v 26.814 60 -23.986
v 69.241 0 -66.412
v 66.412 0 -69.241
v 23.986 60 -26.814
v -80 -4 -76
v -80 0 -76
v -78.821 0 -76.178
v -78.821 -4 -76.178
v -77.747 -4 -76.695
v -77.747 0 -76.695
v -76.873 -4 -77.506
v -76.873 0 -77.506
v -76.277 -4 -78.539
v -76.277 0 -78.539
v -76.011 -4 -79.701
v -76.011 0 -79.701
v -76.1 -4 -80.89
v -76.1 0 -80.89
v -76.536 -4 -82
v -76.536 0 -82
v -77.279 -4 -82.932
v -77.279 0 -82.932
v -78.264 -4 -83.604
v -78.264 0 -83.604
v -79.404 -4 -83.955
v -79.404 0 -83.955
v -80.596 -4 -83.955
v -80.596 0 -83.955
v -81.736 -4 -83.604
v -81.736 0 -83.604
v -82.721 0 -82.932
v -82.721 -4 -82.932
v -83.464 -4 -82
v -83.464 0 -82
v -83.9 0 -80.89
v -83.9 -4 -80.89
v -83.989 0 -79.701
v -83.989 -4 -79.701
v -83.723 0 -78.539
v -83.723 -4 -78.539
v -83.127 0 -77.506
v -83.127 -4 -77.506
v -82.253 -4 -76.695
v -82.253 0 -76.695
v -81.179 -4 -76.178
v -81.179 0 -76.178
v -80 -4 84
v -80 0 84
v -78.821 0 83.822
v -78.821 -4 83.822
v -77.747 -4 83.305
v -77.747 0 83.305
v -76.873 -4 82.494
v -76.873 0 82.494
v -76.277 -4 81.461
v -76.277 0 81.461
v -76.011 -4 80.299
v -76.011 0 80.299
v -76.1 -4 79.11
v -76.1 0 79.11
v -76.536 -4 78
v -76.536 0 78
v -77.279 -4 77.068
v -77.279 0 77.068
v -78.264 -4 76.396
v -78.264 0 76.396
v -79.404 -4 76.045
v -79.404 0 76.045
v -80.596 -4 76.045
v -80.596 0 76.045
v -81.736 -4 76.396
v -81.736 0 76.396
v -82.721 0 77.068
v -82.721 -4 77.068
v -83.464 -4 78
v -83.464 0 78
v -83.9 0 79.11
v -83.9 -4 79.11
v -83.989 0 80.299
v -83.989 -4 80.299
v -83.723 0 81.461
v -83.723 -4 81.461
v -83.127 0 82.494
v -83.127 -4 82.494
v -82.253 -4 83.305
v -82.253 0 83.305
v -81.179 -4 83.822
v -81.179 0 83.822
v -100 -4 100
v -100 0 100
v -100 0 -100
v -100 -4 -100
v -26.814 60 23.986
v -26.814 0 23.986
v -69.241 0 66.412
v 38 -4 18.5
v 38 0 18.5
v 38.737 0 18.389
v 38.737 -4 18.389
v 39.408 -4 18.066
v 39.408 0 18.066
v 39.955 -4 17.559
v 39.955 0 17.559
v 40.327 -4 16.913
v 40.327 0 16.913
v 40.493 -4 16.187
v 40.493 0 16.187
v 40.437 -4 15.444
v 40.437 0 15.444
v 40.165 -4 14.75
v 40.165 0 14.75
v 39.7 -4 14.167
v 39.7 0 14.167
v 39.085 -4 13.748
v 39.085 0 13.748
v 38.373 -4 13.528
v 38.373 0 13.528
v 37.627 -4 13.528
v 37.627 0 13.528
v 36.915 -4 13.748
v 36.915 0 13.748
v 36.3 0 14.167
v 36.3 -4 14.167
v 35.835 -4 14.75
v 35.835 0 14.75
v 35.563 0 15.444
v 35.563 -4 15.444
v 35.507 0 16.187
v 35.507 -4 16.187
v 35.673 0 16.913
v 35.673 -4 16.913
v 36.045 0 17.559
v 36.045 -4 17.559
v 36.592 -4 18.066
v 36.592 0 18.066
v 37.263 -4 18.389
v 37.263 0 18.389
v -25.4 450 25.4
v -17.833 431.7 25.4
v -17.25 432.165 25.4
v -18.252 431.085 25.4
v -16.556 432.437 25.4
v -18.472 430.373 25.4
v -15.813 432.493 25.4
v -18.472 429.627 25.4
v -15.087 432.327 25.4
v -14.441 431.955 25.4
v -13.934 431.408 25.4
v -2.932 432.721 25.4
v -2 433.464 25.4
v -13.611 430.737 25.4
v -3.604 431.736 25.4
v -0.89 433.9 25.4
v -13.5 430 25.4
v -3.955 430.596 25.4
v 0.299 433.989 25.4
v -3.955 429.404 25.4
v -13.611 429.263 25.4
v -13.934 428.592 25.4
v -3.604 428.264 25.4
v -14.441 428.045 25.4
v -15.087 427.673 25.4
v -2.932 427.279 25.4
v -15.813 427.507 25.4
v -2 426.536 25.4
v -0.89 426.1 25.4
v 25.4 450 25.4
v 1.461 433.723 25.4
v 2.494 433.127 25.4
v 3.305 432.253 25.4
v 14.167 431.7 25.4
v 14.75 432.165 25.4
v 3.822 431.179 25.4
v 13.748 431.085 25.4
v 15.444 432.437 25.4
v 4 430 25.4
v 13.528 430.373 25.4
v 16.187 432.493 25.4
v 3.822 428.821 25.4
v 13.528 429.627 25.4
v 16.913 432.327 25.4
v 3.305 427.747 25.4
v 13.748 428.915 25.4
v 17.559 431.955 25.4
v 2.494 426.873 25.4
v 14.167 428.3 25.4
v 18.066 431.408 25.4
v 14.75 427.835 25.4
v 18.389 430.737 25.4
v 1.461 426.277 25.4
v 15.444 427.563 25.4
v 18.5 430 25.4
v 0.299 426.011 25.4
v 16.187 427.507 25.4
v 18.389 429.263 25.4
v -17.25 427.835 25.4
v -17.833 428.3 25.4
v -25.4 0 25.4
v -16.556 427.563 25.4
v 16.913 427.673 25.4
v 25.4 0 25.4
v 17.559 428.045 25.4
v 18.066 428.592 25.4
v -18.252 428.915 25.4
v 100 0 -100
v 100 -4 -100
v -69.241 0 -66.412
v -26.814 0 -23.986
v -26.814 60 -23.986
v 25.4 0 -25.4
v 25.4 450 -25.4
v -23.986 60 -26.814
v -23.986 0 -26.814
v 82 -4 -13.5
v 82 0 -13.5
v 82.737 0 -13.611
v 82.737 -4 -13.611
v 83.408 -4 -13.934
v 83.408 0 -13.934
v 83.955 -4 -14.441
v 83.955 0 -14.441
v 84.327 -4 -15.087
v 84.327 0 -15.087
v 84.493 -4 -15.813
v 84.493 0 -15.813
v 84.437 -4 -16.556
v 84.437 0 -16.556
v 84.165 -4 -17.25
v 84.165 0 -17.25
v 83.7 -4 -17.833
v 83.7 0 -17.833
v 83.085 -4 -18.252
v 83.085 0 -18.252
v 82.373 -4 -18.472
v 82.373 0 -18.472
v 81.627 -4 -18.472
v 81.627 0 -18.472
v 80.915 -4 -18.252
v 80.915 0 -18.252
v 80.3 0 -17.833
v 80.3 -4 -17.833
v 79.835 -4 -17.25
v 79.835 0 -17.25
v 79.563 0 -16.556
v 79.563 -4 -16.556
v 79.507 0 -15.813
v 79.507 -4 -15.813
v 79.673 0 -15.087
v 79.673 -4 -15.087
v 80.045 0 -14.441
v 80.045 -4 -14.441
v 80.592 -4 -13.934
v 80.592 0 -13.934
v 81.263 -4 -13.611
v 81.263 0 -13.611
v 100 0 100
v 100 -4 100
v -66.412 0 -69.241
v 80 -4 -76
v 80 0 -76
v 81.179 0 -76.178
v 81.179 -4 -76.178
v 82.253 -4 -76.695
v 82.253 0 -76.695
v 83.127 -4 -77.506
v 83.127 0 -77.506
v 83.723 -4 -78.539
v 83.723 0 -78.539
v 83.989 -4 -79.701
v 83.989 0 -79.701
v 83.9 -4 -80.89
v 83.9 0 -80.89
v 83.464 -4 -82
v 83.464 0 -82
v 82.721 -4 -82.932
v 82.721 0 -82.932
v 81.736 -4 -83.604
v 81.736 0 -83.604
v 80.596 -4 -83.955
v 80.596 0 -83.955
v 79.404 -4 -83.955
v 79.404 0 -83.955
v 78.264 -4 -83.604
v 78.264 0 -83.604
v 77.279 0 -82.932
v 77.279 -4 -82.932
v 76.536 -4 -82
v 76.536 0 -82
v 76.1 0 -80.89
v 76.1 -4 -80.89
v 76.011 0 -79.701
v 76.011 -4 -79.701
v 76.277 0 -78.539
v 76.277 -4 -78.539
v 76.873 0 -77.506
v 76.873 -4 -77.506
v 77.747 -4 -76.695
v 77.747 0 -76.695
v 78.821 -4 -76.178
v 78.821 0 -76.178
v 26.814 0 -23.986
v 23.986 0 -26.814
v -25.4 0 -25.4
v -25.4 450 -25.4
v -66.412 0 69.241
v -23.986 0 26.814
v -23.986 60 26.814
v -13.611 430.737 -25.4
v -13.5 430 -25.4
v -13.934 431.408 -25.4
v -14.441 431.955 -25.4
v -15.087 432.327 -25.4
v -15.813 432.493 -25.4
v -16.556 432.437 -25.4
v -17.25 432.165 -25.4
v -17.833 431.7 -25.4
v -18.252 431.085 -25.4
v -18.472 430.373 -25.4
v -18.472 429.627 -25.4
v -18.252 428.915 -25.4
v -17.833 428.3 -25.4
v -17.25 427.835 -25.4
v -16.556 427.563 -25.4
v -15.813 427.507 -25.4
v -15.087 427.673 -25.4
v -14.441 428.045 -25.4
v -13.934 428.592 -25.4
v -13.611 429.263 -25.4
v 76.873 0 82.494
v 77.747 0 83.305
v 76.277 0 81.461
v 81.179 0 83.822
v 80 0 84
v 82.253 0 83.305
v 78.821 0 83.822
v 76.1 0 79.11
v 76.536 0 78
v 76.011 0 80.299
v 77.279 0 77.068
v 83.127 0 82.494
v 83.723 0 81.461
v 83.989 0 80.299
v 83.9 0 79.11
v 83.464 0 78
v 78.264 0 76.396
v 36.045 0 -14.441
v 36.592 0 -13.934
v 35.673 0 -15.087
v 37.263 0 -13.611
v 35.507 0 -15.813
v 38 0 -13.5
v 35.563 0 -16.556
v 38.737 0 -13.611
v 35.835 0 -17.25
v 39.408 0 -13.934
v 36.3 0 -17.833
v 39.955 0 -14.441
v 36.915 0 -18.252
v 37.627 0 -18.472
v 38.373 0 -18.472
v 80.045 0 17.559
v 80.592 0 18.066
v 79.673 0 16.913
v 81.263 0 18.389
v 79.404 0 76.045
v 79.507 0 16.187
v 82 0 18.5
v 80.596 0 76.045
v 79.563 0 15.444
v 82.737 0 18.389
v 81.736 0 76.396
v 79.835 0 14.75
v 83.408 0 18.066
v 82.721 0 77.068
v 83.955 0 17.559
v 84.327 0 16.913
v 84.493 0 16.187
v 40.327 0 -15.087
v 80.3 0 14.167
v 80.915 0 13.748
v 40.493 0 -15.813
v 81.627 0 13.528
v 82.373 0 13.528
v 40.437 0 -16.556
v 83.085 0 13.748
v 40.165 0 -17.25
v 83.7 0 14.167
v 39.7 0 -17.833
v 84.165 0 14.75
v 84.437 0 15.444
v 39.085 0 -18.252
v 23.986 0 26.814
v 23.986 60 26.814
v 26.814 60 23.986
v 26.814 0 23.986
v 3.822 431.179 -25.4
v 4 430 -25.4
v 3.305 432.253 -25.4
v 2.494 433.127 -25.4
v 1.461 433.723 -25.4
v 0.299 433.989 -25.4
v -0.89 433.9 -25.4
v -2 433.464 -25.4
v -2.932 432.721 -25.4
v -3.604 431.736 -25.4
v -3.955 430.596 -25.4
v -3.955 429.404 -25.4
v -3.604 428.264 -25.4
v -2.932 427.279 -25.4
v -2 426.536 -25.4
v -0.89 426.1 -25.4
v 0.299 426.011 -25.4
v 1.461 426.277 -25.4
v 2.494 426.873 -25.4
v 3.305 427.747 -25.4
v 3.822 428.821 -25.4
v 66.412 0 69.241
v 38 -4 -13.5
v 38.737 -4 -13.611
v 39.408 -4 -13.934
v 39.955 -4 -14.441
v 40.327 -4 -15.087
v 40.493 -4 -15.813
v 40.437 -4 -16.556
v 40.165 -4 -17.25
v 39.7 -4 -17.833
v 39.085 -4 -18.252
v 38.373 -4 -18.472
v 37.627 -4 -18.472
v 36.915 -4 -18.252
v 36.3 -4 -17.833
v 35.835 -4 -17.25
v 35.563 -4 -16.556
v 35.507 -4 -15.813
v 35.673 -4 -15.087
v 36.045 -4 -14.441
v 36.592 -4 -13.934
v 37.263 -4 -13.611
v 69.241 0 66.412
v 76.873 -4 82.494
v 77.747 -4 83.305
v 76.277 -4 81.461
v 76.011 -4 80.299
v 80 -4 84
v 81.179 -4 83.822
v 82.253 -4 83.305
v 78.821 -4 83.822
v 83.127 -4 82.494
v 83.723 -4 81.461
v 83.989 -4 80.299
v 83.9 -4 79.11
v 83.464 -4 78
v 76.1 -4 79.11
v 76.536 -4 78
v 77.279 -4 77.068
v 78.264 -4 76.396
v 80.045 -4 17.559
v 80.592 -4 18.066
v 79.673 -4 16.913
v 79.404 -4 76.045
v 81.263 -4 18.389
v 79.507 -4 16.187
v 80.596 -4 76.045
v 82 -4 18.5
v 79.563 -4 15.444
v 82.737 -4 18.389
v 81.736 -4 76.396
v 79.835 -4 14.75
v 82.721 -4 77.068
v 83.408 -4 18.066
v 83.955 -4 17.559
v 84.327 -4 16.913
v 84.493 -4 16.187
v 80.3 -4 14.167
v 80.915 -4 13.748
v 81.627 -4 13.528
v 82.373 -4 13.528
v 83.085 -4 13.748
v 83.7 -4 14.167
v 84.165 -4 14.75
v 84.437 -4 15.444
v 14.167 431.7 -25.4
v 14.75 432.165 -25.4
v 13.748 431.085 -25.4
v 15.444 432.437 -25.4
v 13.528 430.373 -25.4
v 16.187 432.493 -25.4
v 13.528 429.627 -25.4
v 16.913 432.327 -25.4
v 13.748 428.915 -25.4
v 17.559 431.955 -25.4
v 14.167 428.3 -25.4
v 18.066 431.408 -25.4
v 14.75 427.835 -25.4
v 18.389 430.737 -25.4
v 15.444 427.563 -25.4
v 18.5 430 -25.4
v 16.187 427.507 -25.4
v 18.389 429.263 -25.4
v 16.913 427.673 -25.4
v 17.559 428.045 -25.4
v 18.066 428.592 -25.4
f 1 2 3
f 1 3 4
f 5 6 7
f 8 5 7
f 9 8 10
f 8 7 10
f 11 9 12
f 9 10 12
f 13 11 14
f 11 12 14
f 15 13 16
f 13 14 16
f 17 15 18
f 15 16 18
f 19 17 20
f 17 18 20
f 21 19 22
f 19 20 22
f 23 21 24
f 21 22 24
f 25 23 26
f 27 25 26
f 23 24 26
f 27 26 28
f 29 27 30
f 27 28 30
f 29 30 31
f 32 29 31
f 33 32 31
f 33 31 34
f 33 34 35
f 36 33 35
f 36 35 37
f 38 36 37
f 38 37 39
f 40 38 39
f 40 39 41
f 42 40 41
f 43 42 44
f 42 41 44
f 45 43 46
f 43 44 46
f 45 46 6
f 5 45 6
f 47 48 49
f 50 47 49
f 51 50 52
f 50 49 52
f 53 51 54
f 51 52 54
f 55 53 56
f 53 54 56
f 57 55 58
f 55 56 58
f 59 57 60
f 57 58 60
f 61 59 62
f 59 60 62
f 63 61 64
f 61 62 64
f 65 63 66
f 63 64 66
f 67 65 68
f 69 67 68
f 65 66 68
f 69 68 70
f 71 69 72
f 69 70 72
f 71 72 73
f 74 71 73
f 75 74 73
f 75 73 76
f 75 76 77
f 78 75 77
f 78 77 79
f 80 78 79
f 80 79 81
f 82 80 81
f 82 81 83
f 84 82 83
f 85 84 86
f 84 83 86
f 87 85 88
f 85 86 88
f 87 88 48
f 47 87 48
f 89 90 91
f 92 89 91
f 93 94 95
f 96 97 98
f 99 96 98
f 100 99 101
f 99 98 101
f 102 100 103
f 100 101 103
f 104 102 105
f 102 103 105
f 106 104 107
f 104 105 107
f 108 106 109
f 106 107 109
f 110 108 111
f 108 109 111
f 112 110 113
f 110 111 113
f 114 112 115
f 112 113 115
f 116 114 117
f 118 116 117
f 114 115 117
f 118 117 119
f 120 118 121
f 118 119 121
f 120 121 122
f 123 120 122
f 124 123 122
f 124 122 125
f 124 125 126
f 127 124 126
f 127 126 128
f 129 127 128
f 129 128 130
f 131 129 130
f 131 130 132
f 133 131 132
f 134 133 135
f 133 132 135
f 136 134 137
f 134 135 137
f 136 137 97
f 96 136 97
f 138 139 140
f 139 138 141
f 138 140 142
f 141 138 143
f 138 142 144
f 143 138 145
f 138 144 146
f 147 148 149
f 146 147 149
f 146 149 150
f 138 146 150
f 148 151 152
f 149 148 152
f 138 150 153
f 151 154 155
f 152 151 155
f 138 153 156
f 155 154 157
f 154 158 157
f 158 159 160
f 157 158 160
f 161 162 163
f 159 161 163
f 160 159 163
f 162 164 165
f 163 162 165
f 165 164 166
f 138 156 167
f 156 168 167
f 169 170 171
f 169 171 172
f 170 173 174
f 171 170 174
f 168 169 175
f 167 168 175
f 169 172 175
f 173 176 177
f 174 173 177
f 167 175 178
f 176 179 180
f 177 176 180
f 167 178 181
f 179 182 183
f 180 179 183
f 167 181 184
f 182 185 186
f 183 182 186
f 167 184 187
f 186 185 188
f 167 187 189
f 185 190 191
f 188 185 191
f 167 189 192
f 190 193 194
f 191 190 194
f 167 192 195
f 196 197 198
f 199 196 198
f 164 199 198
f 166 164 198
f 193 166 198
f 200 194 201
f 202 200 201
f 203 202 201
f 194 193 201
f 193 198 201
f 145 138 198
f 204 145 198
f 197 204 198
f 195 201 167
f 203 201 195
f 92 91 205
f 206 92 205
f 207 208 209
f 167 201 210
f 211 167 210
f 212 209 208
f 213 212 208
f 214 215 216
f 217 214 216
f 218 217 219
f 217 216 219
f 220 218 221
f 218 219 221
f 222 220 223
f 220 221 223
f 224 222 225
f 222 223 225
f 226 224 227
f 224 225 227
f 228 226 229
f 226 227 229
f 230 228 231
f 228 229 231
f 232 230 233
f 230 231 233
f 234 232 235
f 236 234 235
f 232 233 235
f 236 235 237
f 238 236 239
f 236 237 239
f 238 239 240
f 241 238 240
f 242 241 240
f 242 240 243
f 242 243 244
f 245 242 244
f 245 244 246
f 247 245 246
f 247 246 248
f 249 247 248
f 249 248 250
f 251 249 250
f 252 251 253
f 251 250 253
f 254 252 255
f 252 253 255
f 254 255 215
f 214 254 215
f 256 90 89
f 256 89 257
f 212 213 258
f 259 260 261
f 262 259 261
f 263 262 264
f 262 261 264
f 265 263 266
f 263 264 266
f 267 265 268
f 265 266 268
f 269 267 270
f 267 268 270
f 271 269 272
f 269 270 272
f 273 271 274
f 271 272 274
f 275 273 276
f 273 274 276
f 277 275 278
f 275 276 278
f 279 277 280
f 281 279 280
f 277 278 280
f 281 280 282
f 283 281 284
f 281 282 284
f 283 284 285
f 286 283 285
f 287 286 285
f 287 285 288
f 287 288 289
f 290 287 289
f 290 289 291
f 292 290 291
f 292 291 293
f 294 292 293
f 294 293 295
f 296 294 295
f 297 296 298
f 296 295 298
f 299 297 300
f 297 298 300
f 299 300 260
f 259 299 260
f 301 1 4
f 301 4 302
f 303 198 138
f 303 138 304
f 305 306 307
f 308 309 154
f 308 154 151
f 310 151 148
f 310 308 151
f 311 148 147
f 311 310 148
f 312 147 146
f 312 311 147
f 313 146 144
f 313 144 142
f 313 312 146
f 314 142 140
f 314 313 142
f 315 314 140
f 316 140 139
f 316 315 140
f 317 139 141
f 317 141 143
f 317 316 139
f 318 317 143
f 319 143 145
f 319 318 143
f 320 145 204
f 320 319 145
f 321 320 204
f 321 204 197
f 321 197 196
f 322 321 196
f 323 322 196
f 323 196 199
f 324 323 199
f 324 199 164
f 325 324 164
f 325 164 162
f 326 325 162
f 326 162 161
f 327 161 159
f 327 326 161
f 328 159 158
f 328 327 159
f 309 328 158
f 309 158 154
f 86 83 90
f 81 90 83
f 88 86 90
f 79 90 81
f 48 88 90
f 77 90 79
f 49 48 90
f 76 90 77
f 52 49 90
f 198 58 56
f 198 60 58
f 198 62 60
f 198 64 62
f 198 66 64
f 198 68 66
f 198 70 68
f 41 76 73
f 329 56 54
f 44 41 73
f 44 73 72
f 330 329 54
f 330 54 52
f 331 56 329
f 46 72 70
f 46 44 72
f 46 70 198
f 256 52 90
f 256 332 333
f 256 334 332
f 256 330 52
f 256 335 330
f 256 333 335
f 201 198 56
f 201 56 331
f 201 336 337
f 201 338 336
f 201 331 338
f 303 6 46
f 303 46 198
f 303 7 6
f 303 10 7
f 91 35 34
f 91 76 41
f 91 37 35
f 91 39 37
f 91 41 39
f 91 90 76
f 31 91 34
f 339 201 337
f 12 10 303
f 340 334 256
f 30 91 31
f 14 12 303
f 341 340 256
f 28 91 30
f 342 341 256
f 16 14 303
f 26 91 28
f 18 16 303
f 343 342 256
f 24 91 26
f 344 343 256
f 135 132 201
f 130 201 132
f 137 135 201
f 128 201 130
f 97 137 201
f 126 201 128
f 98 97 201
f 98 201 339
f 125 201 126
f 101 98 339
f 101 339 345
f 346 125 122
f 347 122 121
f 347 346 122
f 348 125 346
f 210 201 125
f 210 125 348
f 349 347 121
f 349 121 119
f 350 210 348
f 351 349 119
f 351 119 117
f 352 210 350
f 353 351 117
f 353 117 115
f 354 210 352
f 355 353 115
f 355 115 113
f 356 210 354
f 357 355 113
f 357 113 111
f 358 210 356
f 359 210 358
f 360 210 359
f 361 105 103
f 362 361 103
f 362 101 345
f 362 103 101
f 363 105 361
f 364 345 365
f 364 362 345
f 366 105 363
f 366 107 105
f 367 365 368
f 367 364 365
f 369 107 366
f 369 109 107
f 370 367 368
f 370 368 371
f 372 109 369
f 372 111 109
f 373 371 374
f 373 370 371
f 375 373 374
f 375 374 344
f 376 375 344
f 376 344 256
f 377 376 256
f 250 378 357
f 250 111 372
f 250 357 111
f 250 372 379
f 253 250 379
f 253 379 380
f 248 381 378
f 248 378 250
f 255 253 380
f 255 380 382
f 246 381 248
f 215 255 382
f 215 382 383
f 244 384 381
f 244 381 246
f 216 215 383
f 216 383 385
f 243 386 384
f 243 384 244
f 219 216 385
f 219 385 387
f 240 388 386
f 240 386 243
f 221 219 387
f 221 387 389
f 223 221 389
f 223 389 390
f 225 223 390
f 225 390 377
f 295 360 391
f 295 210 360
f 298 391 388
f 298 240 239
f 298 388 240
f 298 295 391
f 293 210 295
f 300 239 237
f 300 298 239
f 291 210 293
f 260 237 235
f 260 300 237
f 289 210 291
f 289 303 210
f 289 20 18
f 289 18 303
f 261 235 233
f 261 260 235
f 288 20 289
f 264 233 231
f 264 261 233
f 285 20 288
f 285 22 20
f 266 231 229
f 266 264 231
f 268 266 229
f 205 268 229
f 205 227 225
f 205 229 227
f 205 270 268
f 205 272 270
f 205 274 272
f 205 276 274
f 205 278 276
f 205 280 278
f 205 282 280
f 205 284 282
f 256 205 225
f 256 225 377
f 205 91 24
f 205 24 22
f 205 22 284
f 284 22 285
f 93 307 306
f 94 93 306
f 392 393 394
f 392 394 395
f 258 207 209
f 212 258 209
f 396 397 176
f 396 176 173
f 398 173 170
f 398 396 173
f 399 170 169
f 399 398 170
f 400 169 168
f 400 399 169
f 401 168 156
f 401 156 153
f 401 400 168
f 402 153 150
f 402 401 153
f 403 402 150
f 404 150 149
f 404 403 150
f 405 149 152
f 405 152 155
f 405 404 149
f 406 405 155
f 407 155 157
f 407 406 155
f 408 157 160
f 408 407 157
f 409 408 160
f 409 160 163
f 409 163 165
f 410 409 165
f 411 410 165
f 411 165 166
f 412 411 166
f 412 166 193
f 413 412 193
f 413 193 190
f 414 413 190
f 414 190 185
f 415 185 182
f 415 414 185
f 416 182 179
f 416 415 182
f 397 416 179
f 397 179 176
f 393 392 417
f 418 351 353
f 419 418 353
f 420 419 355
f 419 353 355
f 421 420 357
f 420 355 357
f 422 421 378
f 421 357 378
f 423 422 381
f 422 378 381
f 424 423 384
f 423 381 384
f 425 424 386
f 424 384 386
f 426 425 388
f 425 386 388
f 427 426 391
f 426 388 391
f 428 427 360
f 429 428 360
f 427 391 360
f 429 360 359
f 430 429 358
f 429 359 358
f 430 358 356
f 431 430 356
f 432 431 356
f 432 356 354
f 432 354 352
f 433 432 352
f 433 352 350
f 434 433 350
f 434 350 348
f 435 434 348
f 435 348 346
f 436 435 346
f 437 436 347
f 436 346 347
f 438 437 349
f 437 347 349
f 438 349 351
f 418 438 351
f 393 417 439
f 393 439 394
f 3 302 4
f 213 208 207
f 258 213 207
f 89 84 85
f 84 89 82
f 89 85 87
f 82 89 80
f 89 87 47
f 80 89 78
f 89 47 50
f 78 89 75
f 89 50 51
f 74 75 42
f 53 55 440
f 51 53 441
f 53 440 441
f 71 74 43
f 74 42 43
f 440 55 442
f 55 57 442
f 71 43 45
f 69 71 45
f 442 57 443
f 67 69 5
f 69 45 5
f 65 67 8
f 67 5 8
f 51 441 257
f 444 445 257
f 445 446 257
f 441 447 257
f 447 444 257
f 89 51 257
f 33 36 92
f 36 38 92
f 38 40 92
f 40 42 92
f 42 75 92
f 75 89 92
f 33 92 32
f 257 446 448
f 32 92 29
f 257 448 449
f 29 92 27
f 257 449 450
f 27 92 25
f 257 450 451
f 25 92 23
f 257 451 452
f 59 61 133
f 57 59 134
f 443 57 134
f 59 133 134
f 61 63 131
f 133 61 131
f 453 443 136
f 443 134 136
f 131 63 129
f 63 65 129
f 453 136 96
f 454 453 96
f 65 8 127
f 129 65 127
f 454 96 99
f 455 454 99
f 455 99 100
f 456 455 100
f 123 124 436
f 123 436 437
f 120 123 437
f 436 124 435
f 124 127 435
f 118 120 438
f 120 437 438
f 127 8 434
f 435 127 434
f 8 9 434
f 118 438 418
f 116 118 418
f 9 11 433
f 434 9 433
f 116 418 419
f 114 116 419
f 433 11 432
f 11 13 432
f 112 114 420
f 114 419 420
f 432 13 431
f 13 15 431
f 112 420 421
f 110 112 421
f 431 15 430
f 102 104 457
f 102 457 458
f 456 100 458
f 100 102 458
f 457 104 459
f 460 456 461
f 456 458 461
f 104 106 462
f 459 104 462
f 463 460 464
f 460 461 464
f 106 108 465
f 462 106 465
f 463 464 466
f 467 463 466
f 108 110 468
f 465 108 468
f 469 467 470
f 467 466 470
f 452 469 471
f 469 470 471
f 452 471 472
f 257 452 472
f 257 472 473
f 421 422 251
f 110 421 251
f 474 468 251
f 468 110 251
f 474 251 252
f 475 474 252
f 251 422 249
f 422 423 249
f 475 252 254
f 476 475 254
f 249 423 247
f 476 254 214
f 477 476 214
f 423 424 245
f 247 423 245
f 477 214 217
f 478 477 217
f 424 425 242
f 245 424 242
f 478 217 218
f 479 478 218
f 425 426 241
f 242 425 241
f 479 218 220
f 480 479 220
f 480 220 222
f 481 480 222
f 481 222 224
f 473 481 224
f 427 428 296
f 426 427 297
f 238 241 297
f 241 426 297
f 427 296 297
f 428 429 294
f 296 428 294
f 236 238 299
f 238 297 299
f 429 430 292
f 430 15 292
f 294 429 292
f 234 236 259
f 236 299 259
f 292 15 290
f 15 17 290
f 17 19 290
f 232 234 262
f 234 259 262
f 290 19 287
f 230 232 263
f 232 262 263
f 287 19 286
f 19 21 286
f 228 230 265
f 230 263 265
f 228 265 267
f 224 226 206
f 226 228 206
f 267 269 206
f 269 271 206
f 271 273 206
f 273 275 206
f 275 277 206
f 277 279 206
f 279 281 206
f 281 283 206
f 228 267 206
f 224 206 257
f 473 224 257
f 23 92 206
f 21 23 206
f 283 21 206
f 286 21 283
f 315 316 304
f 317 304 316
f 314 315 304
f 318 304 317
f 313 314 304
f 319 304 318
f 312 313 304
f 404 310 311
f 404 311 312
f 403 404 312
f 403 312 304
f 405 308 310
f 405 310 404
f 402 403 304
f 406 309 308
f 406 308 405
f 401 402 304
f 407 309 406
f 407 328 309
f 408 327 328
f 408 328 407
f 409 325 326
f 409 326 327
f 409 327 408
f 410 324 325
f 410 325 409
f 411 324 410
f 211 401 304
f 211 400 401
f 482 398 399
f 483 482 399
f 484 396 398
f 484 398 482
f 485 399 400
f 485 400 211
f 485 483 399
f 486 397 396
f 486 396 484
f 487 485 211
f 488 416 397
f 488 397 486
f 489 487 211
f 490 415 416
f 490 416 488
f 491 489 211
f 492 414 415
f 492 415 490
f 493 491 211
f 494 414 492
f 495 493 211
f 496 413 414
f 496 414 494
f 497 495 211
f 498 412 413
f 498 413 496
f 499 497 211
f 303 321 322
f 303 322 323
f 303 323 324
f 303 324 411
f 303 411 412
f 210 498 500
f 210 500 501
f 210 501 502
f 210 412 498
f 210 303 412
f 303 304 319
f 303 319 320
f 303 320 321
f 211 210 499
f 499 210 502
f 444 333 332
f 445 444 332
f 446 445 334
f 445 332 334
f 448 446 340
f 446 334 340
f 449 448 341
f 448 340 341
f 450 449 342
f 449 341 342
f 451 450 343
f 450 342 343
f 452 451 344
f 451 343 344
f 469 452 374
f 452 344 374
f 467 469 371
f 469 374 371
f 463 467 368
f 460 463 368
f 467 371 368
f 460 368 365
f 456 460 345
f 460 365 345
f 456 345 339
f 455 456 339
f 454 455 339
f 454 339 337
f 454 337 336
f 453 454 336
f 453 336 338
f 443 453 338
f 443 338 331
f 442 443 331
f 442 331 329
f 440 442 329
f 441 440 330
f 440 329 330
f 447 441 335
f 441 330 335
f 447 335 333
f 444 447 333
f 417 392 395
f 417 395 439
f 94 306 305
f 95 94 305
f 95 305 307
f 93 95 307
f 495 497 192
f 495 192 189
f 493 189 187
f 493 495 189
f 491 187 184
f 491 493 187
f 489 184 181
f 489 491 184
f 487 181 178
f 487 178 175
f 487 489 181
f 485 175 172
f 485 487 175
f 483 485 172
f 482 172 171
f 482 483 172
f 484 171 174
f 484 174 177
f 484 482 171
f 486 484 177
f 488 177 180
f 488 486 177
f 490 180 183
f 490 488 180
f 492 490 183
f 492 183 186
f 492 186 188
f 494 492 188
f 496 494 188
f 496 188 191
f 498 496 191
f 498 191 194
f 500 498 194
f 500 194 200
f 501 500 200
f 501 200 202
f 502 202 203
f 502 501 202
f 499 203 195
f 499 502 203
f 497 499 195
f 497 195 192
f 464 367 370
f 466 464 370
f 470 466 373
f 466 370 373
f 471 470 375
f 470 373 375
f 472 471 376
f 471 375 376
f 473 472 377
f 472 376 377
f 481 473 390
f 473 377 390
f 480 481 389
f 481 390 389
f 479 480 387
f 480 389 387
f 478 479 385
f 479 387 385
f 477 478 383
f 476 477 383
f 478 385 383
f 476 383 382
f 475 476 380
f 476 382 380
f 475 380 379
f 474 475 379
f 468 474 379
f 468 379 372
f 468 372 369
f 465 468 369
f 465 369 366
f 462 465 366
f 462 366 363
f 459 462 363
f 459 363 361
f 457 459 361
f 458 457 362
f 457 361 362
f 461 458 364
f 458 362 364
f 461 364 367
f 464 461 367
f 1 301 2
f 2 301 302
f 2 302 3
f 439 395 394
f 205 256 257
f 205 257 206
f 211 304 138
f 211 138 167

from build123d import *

# Parameters (mm, degrees)
ESBO_O1_W                       = 200
ESBO_O1_H                       = 200
RESSALTO_EXTRUS_O2_DEPTH        = 4
ESBO_O2_W                       = 50.8
ESBO_O2_H                       = 50.8
RESSALTO_EXTRUS_O3_DEPTH        = 450
ESBO_O3_R                       = 4
CORTE_EXTRUS_O1_DEPTH           = 4
CORTE_EXTRUS_O2_DEPTH           = 25.4
CORTE_EXTRUS_O2_DEPTH_BACK      = 25.4
ESBO_O5_R                       = 4
ESBO_O5_R_2                     = 2.5
ESBO_O6_R                       = 2.5
CORTE_EXTRUS_O3_DEPTH           = 4
RESSALTO_EXTRUS_O7_DEPTH        = 2
RESSALTO_EXTRUS_O7_DEPTH_BACK   = 2
RESSALTO_EXTRUS_O7_2_DEPTH      = 2
RESSALTO_EXTRUS_O7_2_DEPTH_BACK = 2
RESSALTO_EXTRUS_O8_DEPTH        = 2
RESSALTO_EXTRUS_O8_DEPTH_BACK   = 2
RESSALTO_EXTRUS_O8_2_DEPTH      = 2
RESSALTO_EXTRUS_O8_2_DEPTH_BACK = 2


with BuildPart() as part:
    # Esboço1 → Ressalto-extrusão2 (new body)
    with BuildSketch(Plane(origin=(0, 0, 0), x_dir=(1, 0, 0), z_dir=(0, 1, 0))):
        Rectangle(ESBO_O1_W, ESBO_O1_H)
    extrude(amount=-RESSALTO_EXTRUS_O2_DEPTH)

    # Esboço2 → Ressalto-extrusão3 (add)
    with BuildSketch(Plane(origin=(0, 0, 0), x_dir=(1, 0, 0), z_dir=(0, 1, 0))):
        Rectangle(ESBO_O2_W, ESBO_O2_H)
    extrude(amount=RESSALTO_EXTRUS_O3_DEPTH)

    # Esboço3 → Corte-extrusão1 (cut)
    with BuildSketch(Plane(origin=(0, 0, 0), x_dir=(1, 0, 0), z_dir=(0, 1, 0))):
        with Locations((80, -80)):
            Circle(ESBO_O3_R)
        with Locations((80, 80)):
            Circle(ESBO_O3_R)
        with Locations((-80, 80)):
            Circle(ESBO_O3_R)
        with Locations((-80, -80)):
            Circle(ESBO_O3_R)
    extrude(amount=-CORTE_EXTRUS_O1_DEPTH, mode=Mode.SUBTRACT)

    # Esboço5 → Corte-extrusão2 (cut, two sides: drawn at the far end of the back side and taken through both)
    with BuildSketch(Plane.XY.offset(-CORTE_EXTRUS_O2_DEPTH_BACK)):
        with Locations((0, 430)):
            Circle(ESBO_O5_R)
        with Locations((16, 430)):
            Circle(ESBO_O5_R_2)
        with Locations((-16, 430)):
            Circle(ESBO_O5_R_2)
    extrude(amount=CORTE_EXTRUS_O2_DEPTH + CORTE_EXTRUS_O2_DEPTH_BACK, mode=Mode.SUBTRACT)

    # Esboço6 → Corte-extrusão3 (cut)
    with BuildSketch(Plane(origin=(0, 0, 0), x_dir=(1, 0, 0), z_dir=(0, 1, 0))):
        with Locations((82, 16)):
            Circle(ESBO_O6_R)
        with Locations((82, -16)):
            Circle(ESBO_O6_R)
        with Locations((38, 16)):
            Circle(ESBO_O6_R)
        with Locations((38, -16)):
            Circle(ESBO_O6_R)
    extrude(amount=-CORTE_EXTRUS_O3_DEPTH, mode=Mode.SUBTRACT)


with BuildPart() as body_2:
    # Esboço8 → Ressalto-extrusão7 (new, two sides: drawn at the far end of the back side and taken through both)
    with BuildSketch(Plane(origin=(0, 0, 0), x_dir=(-0.7071067811865476, 0, -0.7071067811865476), z_dir=(0.7071067811865476, 0, -0.7071067811865476)).offset(-RESSALTO_EXTRUS_O7_DEPTH_BACK)):
        Polygon((35.92102448, 0), (95.92102448, 0), (35.92102448, 60), align=None)
    extrude(amount=RESSALTO_EXTRUS_O7_DEPTH + RESSALTO_EXTRUS_O7_DEPTH_BACK)


with BuildPart() as body_3:
    # Esboço8 → Ressalto-extrus_o7 2 (new, two sides: drawn at the far end of the back side and taken through both)
    with BuildSketch(Plane(origin=(0, 0, 0), x_dir=(-0.7071067811865476, 0, -0.7071067811865476), z_dir=(0.7071067811865476, 0, -0.7071067811865476)).offset(-RESSALTO_EXTRUS_O7_2_DEPTH_BACK)):
        Polygon((-35.92102448, 0), (-95.92102448, 0), (-35.92102448, 60), align=None)
    extrude(amount=RESSALTO_EXTRUS_O7_2_DEPTH + RESSALTO_EXTRUS_O7_2_DEPTH_BACK)


with BuildPart() as body_4:
    # Esboço10 → Ressalto-extrusão8 (new, two sides: drawn at the far end of the back side and taken through both)
    with BuildSketch(Plane(origin=(0, 0, 0), x_dir=(-0.7071067811865476, 0, 0.7071067811865476), z_dir=(-0.7071067811865476, 0, -0.7071067811865476)).offset(-RESSALTO_EXTRUS_O8_DEPTH_BACK)):
        Polygon((35.92102448, 0), (95.92102448, 0), (35.92102448, 60), align=None)
    extrude(amount=RESSALTO_EXTRUS_O8_DEPTH + RESSALTO_EXTRUS_O8_DEPTH_BACK)


with BuildPart() as body_5:
    # Esboço10 → Ressalto-extrus_o8 2 (new, two sides: drawn at the far end of the back side and taken through both)
    with BuildSketch(Plane(origin=(0, 0, 0), x_dir=(-0.7071067811865476, 0, 0.7071067811865476), z_dir=(-0.7071067811865476, 0, -0.7071067811865476)).offset(-RESSALTO_EXTRUS_O8_2_DEPTH_BACK)):
        Polygon((-35.92102448, 0), (-95.92102448, 0), (-35.92102448, 60), align=None)
    extrude(amount=RESSALTO_EXTRUS_O8_2_DEPTH + RESSALTO_EXTRUS_O8_2_DEPTH_BACK)


solid = Compound([part.part, body_2.part, body_3.part, body_4.part, body_5.part])
